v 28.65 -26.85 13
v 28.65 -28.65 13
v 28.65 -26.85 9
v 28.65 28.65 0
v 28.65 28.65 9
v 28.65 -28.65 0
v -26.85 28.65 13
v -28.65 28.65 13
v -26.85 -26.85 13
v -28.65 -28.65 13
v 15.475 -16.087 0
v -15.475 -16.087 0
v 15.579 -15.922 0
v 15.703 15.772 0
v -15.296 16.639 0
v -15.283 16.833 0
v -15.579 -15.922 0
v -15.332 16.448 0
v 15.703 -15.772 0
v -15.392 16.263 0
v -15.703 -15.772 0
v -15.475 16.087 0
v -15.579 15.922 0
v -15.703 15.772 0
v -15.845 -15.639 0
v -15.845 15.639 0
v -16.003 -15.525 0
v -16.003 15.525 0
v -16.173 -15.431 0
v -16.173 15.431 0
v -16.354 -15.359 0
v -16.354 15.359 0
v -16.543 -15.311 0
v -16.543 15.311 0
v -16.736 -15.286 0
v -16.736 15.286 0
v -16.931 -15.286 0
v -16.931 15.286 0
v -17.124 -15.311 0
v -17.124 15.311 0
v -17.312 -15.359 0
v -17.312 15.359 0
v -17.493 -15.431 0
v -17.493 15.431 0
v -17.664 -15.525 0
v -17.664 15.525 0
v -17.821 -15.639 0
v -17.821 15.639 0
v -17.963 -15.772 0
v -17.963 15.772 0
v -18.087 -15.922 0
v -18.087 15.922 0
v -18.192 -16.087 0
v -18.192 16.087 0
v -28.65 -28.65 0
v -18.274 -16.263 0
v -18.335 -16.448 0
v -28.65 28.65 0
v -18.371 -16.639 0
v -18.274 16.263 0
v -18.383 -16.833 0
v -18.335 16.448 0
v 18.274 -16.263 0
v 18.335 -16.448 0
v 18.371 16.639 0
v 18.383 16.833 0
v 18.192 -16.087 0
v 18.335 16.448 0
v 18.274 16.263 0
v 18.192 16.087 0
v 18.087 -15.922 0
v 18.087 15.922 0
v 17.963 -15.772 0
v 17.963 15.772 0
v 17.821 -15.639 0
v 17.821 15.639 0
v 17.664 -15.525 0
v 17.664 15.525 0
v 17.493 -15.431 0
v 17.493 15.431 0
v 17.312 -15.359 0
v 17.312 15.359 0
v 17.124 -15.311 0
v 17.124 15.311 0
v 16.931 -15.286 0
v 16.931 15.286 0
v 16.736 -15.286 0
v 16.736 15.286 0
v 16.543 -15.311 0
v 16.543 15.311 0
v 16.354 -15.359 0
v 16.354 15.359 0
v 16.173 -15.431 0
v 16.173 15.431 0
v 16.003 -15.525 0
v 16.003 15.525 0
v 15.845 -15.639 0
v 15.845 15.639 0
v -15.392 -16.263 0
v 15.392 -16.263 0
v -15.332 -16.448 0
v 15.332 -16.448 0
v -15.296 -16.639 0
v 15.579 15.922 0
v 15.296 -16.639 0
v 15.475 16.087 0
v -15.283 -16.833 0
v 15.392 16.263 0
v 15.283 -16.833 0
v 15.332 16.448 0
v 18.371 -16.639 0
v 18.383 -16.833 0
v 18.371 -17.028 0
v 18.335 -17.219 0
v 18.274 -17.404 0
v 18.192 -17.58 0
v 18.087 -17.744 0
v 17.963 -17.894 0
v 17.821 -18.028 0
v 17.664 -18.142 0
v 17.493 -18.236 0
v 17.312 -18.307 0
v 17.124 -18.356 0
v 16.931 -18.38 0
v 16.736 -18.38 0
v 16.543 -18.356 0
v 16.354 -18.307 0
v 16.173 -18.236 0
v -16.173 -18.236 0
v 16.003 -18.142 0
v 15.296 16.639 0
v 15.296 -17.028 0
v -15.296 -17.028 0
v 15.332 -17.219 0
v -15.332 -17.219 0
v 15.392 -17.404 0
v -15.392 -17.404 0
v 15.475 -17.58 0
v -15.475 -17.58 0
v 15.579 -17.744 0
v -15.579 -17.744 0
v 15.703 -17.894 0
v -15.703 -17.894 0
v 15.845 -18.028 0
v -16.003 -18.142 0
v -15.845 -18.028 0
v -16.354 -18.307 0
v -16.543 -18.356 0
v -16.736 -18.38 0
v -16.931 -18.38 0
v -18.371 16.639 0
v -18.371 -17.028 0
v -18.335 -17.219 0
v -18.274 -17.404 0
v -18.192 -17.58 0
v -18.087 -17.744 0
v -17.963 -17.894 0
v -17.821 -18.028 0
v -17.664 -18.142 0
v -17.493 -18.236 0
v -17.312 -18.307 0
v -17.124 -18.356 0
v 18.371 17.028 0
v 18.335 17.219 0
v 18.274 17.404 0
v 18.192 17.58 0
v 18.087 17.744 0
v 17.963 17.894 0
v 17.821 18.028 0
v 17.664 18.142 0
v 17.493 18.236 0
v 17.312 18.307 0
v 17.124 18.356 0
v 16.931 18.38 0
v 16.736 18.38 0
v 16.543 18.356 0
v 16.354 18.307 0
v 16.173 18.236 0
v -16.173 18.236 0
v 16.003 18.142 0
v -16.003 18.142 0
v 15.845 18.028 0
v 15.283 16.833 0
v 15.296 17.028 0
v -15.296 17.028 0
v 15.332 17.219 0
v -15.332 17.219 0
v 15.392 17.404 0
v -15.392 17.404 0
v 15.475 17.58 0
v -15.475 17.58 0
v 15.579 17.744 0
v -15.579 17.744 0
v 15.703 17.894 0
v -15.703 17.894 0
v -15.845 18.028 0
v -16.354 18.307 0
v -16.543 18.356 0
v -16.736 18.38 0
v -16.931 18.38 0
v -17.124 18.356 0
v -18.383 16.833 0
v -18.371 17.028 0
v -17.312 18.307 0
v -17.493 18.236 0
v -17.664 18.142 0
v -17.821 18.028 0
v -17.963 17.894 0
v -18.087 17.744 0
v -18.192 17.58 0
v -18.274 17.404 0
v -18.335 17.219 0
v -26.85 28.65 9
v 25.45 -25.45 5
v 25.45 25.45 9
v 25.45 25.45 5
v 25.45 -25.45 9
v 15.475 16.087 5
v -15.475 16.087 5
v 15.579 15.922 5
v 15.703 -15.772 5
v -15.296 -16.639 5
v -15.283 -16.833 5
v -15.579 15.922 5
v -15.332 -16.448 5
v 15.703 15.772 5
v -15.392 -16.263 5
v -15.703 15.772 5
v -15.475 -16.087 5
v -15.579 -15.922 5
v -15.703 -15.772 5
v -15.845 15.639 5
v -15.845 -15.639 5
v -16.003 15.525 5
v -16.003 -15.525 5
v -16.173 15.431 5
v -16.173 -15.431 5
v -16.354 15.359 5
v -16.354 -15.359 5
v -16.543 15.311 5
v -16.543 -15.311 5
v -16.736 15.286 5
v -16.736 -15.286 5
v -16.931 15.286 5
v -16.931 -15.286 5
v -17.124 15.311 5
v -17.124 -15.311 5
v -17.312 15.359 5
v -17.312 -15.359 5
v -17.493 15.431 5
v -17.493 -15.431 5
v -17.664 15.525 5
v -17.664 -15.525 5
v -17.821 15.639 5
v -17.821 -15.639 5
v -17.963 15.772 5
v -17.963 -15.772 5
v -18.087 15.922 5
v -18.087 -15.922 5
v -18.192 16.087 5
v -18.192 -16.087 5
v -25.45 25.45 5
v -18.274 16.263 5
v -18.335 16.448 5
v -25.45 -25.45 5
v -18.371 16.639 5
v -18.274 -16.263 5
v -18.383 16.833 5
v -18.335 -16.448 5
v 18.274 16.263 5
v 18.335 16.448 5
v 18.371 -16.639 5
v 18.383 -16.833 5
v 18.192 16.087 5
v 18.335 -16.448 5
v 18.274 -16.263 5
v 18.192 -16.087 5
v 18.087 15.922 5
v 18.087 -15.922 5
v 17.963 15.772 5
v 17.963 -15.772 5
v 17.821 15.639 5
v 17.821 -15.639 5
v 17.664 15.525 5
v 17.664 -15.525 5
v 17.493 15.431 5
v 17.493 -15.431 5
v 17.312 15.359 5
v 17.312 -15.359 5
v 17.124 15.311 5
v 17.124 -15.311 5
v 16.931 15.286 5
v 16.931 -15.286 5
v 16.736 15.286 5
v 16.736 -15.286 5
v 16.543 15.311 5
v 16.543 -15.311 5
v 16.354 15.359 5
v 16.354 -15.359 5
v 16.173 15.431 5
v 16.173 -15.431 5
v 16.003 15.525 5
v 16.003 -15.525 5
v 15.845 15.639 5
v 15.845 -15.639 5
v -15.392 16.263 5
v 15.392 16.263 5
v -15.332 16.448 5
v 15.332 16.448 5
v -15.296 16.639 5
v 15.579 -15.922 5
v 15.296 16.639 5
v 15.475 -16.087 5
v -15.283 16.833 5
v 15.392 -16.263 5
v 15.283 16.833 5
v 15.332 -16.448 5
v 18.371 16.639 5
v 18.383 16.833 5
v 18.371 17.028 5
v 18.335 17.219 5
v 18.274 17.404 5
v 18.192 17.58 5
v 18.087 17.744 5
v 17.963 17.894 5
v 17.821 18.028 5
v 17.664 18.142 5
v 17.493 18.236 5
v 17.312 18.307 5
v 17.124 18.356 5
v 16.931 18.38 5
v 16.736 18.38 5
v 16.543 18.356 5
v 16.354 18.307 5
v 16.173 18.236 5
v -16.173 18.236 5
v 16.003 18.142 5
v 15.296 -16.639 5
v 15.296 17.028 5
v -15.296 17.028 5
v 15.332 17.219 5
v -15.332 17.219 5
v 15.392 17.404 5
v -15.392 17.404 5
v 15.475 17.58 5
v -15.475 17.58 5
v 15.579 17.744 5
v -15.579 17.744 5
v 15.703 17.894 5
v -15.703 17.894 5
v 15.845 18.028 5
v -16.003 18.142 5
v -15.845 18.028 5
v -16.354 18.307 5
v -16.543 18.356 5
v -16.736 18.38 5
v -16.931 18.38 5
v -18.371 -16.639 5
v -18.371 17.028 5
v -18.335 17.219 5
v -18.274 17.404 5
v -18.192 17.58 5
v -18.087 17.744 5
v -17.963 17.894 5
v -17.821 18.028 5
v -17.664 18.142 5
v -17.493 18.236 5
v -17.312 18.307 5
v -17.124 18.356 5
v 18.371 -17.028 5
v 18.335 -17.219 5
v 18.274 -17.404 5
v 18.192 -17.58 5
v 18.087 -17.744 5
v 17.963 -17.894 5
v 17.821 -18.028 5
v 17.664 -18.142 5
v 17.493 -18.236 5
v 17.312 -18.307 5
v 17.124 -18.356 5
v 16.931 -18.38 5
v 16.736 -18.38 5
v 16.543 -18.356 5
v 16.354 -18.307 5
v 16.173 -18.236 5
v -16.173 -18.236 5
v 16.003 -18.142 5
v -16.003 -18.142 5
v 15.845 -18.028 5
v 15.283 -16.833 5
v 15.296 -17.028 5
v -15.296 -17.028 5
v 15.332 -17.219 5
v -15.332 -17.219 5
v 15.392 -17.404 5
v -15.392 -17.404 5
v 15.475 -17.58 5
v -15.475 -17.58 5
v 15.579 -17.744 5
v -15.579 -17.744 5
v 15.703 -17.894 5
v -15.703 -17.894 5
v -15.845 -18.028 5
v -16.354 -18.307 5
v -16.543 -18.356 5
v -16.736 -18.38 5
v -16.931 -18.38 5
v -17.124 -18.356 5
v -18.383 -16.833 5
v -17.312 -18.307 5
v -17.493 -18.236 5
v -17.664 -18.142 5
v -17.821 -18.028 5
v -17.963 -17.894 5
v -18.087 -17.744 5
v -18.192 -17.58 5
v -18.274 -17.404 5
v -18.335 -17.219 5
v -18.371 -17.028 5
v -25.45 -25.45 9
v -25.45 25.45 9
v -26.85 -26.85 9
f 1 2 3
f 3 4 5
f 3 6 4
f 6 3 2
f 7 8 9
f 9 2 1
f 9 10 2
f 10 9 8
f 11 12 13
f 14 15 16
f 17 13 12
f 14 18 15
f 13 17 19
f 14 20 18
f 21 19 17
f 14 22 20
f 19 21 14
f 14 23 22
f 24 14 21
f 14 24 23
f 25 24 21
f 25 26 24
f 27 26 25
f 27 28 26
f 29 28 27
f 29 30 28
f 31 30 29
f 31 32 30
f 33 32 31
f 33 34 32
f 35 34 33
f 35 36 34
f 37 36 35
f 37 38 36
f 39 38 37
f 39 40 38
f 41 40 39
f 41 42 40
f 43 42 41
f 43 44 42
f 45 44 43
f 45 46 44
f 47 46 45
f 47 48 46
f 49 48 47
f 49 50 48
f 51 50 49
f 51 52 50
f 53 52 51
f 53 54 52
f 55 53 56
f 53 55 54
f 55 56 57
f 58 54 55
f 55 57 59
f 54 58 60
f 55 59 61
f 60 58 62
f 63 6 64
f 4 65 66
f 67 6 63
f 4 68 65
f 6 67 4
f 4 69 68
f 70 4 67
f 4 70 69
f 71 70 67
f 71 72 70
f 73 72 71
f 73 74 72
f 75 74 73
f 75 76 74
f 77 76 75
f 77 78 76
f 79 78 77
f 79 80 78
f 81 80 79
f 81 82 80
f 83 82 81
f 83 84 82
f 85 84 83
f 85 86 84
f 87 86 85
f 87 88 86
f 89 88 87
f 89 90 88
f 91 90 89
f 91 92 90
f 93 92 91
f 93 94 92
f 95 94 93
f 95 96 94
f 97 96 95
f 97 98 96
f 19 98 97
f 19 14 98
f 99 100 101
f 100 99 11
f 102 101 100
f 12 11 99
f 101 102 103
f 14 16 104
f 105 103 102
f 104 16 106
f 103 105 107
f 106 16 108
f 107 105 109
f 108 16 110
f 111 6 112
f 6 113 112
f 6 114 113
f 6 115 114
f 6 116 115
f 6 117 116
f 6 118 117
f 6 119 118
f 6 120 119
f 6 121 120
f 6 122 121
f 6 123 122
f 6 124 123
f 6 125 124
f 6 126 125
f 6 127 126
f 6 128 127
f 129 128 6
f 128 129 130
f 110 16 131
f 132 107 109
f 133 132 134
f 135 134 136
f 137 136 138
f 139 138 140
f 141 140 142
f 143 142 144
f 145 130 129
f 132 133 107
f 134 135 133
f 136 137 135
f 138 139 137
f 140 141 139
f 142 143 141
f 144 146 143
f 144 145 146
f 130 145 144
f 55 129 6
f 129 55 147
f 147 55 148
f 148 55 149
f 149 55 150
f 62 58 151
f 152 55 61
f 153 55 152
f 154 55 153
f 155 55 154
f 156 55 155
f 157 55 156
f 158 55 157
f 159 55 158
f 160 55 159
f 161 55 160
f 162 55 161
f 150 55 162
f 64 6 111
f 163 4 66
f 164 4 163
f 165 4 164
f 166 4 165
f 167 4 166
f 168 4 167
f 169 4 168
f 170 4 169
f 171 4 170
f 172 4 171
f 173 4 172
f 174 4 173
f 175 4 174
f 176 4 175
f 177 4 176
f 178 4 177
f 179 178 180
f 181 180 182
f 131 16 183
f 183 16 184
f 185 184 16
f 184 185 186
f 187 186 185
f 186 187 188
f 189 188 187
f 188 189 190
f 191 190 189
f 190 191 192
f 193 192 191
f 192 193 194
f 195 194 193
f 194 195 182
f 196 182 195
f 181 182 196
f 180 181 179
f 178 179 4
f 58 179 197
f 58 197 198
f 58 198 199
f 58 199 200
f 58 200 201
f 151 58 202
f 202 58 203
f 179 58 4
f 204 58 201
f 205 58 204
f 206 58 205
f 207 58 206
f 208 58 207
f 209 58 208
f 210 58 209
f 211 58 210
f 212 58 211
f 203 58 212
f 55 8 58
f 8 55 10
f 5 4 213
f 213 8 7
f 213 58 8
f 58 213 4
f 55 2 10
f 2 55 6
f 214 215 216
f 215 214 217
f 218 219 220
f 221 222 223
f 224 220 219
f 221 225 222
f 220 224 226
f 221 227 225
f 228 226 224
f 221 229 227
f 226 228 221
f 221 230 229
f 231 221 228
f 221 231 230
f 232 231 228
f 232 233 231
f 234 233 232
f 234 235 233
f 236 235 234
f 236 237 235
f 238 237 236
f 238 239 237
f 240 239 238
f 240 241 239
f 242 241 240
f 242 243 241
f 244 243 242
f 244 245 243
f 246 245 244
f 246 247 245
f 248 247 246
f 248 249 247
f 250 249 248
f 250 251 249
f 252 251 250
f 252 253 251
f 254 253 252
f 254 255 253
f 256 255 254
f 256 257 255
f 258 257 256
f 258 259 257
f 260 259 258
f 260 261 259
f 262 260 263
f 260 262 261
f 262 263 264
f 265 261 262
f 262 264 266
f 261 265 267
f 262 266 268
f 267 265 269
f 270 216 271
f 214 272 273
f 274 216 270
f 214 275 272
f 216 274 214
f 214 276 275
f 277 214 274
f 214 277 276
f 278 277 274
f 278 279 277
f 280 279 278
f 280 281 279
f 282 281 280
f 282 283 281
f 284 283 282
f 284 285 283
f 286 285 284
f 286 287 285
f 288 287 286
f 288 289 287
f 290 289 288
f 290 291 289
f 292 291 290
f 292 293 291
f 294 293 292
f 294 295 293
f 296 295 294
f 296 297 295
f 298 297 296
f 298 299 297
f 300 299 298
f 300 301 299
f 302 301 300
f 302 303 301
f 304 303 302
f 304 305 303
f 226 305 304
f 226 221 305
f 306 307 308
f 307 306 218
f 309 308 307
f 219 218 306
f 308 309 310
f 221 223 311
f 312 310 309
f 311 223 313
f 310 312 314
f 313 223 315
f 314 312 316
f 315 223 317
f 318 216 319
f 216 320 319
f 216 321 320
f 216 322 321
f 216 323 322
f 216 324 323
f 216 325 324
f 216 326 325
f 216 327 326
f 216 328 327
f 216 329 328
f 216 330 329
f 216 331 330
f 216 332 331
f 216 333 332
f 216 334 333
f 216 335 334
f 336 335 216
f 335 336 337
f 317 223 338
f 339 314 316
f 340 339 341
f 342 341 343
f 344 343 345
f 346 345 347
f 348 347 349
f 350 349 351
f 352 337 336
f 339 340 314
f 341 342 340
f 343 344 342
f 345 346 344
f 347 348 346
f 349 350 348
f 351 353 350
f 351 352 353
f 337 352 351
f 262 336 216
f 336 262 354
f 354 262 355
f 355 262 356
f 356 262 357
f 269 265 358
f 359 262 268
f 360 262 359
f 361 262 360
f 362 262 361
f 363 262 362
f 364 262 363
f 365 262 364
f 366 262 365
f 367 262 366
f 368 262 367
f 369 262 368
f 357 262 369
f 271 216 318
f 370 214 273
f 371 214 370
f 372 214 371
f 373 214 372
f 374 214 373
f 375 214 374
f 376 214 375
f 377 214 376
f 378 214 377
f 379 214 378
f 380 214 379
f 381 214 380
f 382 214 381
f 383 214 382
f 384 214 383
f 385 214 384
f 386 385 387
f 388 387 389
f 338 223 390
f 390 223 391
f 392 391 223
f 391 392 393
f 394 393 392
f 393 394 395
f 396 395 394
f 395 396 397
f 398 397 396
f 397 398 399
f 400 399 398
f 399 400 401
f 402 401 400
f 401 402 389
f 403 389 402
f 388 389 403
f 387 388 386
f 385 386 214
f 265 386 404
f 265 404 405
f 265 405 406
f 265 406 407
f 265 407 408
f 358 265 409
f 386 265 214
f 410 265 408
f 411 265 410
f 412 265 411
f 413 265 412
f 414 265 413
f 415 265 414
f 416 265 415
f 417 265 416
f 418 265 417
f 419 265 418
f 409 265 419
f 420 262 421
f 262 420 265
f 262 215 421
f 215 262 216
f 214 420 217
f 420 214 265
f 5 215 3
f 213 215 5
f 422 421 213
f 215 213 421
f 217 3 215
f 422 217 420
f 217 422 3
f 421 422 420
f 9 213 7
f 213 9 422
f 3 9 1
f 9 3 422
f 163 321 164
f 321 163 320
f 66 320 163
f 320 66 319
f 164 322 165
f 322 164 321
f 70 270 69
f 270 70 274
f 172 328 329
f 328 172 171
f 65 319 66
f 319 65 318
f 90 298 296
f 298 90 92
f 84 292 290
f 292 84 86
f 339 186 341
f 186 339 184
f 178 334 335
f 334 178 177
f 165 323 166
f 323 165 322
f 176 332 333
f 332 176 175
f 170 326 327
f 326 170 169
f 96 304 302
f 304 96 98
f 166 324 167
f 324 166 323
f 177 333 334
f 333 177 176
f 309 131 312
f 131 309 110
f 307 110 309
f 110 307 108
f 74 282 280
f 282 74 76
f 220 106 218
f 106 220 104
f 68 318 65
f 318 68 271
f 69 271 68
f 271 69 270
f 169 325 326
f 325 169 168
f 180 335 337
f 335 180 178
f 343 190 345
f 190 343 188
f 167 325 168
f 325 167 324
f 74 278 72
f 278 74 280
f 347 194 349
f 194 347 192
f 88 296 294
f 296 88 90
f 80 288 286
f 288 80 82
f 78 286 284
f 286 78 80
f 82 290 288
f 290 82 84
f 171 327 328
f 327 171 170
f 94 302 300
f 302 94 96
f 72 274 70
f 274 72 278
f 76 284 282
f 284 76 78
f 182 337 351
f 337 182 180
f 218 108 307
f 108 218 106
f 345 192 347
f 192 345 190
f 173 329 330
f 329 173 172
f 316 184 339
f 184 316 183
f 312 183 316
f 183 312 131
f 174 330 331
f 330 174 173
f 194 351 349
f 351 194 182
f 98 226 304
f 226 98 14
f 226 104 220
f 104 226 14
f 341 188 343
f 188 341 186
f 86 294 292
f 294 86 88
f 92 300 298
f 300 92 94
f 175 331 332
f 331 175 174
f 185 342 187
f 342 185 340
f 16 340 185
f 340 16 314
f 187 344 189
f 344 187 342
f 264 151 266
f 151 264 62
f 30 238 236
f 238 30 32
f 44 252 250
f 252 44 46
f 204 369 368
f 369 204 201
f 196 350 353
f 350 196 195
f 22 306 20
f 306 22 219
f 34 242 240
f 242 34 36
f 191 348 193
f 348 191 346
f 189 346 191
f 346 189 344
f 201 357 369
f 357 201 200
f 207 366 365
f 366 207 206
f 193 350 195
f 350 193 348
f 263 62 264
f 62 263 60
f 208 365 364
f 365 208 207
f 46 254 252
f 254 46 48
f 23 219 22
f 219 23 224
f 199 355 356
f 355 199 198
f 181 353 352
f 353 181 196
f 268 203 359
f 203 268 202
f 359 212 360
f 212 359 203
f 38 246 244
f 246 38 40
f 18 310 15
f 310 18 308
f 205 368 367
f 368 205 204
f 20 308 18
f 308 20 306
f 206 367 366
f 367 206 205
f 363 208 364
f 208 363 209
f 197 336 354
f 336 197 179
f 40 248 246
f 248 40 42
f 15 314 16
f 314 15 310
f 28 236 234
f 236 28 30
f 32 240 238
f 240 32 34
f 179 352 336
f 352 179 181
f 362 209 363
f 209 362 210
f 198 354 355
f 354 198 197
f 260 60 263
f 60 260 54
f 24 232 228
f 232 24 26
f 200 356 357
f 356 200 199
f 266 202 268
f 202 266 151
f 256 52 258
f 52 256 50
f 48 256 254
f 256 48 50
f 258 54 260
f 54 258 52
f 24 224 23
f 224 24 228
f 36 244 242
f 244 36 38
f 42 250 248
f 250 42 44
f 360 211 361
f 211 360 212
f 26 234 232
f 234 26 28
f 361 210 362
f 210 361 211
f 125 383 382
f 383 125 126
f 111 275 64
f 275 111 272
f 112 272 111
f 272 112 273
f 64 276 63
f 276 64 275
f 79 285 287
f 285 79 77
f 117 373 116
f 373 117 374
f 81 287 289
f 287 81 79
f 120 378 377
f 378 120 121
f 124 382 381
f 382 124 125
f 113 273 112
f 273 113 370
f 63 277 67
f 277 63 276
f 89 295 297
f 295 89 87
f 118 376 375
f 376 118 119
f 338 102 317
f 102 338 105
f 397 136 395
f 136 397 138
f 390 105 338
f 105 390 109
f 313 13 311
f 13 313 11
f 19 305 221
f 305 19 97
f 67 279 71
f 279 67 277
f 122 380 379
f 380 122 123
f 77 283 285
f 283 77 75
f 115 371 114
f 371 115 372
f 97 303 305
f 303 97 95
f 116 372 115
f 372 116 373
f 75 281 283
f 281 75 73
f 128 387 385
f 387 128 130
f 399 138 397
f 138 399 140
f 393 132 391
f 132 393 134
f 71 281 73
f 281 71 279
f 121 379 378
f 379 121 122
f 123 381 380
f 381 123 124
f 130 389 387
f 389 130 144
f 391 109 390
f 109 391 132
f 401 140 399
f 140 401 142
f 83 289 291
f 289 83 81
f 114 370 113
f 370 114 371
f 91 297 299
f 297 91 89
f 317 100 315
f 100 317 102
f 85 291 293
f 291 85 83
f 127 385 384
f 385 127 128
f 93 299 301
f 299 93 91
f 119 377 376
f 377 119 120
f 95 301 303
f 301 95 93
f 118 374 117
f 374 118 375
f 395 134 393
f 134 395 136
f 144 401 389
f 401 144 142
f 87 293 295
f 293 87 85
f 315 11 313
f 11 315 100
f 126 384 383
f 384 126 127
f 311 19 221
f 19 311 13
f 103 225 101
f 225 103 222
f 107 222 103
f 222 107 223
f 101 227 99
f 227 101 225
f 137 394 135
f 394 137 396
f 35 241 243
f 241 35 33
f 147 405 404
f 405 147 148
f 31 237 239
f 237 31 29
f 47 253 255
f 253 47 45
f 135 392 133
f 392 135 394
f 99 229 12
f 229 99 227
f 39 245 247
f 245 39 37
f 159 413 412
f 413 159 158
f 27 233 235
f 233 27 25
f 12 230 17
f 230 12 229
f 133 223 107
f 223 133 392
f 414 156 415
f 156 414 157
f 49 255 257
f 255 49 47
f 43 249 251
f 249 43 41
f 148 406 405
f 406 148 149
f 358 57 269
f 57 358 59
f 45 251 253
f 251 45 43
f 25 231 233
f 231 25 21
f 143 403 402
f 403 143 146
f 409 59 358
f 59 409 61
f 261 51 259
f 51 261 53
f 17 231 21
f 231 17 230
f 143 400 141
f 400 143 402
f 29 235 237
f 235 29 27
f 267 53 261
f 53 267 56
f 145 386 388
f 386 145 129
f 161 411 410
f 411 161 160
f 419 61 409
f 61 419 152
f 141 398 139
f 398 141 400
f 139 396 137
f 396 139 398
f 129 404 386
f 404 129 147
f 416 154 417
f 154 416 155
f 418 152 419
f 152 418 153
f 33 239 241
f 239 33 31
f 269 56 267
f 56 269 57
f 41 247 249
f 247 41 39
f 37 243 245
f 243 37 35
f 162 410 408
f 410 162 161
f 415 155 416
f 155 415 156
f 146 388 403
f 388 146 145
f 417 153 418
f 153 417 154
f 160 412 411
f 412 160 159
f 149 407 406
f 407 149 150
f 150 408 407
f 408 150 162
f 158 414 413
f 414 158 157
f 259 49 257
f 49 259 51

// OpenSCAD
leg_size = 50.5;
leg_clearance = 0.2;
leg_offset = 1.6;
hole_size = 1.55; //radius, incl. clearance
hole_offset = leg_size/6;
stage_1 = 5;
stage_2 = 4;
stage_3 = 4;
wall = leg_offset;

difference(){

translate([0,0,(stage_1+stage_2+stage_3)/2])
cube([leg_size+(2*leg_clearance)+(2*leg_offset)+(2*wall),
    leg_size+(2*leg_clearance)+(2*leg_offset)+(2*wall),
    stage_1+stage_2+stage_3],center=true);

translate([0,0,((stage_2+stage_3)/2)+stage_1])
cube([leg_size+(2*leg_clearance),
    leg_size+(2*leg_clearance),
    stage_2+stage_3],center=true);

translate([(wall+leg_clearance)/2,(wall+leg_clearance)/2,(stage_3/2+stage_1+stage_2)])
cube([leg_size+(2*leg_offset)+wall+leg_clearance,
    leg_size+(2*leg_offset)+wall+leg_clearance,
    stage_3],center=true);

translate([((leg_size/2)-(hole_offset)),((leg_size/2)-(hole_offset)),stage_1/2])
cylinder(stage_1,hole_size,hole_size,center=true,$fn=50);

translate([-((leg_size/2)-(hole_offset)),((leg_size/2)-(hole_offset)),stage_1/2])
cylinder(stage_1,hole_size,hole_size,center=true,$fn=50);

translate([((leg_size/2)-(hole_offset)),-((leg_size/2)-(hole_offset)),stage_1/2])
cylinder(stage_1,hole_size,hole_size,center=true,$fn=50);

translate([-((leg_size/2)-(hole_offset)),-((leg_size/2)-(hole_offset)),stage_1/2])
cylinder(stage_1,hole_size,hole_size,center=true,$fn=50);
    
}
